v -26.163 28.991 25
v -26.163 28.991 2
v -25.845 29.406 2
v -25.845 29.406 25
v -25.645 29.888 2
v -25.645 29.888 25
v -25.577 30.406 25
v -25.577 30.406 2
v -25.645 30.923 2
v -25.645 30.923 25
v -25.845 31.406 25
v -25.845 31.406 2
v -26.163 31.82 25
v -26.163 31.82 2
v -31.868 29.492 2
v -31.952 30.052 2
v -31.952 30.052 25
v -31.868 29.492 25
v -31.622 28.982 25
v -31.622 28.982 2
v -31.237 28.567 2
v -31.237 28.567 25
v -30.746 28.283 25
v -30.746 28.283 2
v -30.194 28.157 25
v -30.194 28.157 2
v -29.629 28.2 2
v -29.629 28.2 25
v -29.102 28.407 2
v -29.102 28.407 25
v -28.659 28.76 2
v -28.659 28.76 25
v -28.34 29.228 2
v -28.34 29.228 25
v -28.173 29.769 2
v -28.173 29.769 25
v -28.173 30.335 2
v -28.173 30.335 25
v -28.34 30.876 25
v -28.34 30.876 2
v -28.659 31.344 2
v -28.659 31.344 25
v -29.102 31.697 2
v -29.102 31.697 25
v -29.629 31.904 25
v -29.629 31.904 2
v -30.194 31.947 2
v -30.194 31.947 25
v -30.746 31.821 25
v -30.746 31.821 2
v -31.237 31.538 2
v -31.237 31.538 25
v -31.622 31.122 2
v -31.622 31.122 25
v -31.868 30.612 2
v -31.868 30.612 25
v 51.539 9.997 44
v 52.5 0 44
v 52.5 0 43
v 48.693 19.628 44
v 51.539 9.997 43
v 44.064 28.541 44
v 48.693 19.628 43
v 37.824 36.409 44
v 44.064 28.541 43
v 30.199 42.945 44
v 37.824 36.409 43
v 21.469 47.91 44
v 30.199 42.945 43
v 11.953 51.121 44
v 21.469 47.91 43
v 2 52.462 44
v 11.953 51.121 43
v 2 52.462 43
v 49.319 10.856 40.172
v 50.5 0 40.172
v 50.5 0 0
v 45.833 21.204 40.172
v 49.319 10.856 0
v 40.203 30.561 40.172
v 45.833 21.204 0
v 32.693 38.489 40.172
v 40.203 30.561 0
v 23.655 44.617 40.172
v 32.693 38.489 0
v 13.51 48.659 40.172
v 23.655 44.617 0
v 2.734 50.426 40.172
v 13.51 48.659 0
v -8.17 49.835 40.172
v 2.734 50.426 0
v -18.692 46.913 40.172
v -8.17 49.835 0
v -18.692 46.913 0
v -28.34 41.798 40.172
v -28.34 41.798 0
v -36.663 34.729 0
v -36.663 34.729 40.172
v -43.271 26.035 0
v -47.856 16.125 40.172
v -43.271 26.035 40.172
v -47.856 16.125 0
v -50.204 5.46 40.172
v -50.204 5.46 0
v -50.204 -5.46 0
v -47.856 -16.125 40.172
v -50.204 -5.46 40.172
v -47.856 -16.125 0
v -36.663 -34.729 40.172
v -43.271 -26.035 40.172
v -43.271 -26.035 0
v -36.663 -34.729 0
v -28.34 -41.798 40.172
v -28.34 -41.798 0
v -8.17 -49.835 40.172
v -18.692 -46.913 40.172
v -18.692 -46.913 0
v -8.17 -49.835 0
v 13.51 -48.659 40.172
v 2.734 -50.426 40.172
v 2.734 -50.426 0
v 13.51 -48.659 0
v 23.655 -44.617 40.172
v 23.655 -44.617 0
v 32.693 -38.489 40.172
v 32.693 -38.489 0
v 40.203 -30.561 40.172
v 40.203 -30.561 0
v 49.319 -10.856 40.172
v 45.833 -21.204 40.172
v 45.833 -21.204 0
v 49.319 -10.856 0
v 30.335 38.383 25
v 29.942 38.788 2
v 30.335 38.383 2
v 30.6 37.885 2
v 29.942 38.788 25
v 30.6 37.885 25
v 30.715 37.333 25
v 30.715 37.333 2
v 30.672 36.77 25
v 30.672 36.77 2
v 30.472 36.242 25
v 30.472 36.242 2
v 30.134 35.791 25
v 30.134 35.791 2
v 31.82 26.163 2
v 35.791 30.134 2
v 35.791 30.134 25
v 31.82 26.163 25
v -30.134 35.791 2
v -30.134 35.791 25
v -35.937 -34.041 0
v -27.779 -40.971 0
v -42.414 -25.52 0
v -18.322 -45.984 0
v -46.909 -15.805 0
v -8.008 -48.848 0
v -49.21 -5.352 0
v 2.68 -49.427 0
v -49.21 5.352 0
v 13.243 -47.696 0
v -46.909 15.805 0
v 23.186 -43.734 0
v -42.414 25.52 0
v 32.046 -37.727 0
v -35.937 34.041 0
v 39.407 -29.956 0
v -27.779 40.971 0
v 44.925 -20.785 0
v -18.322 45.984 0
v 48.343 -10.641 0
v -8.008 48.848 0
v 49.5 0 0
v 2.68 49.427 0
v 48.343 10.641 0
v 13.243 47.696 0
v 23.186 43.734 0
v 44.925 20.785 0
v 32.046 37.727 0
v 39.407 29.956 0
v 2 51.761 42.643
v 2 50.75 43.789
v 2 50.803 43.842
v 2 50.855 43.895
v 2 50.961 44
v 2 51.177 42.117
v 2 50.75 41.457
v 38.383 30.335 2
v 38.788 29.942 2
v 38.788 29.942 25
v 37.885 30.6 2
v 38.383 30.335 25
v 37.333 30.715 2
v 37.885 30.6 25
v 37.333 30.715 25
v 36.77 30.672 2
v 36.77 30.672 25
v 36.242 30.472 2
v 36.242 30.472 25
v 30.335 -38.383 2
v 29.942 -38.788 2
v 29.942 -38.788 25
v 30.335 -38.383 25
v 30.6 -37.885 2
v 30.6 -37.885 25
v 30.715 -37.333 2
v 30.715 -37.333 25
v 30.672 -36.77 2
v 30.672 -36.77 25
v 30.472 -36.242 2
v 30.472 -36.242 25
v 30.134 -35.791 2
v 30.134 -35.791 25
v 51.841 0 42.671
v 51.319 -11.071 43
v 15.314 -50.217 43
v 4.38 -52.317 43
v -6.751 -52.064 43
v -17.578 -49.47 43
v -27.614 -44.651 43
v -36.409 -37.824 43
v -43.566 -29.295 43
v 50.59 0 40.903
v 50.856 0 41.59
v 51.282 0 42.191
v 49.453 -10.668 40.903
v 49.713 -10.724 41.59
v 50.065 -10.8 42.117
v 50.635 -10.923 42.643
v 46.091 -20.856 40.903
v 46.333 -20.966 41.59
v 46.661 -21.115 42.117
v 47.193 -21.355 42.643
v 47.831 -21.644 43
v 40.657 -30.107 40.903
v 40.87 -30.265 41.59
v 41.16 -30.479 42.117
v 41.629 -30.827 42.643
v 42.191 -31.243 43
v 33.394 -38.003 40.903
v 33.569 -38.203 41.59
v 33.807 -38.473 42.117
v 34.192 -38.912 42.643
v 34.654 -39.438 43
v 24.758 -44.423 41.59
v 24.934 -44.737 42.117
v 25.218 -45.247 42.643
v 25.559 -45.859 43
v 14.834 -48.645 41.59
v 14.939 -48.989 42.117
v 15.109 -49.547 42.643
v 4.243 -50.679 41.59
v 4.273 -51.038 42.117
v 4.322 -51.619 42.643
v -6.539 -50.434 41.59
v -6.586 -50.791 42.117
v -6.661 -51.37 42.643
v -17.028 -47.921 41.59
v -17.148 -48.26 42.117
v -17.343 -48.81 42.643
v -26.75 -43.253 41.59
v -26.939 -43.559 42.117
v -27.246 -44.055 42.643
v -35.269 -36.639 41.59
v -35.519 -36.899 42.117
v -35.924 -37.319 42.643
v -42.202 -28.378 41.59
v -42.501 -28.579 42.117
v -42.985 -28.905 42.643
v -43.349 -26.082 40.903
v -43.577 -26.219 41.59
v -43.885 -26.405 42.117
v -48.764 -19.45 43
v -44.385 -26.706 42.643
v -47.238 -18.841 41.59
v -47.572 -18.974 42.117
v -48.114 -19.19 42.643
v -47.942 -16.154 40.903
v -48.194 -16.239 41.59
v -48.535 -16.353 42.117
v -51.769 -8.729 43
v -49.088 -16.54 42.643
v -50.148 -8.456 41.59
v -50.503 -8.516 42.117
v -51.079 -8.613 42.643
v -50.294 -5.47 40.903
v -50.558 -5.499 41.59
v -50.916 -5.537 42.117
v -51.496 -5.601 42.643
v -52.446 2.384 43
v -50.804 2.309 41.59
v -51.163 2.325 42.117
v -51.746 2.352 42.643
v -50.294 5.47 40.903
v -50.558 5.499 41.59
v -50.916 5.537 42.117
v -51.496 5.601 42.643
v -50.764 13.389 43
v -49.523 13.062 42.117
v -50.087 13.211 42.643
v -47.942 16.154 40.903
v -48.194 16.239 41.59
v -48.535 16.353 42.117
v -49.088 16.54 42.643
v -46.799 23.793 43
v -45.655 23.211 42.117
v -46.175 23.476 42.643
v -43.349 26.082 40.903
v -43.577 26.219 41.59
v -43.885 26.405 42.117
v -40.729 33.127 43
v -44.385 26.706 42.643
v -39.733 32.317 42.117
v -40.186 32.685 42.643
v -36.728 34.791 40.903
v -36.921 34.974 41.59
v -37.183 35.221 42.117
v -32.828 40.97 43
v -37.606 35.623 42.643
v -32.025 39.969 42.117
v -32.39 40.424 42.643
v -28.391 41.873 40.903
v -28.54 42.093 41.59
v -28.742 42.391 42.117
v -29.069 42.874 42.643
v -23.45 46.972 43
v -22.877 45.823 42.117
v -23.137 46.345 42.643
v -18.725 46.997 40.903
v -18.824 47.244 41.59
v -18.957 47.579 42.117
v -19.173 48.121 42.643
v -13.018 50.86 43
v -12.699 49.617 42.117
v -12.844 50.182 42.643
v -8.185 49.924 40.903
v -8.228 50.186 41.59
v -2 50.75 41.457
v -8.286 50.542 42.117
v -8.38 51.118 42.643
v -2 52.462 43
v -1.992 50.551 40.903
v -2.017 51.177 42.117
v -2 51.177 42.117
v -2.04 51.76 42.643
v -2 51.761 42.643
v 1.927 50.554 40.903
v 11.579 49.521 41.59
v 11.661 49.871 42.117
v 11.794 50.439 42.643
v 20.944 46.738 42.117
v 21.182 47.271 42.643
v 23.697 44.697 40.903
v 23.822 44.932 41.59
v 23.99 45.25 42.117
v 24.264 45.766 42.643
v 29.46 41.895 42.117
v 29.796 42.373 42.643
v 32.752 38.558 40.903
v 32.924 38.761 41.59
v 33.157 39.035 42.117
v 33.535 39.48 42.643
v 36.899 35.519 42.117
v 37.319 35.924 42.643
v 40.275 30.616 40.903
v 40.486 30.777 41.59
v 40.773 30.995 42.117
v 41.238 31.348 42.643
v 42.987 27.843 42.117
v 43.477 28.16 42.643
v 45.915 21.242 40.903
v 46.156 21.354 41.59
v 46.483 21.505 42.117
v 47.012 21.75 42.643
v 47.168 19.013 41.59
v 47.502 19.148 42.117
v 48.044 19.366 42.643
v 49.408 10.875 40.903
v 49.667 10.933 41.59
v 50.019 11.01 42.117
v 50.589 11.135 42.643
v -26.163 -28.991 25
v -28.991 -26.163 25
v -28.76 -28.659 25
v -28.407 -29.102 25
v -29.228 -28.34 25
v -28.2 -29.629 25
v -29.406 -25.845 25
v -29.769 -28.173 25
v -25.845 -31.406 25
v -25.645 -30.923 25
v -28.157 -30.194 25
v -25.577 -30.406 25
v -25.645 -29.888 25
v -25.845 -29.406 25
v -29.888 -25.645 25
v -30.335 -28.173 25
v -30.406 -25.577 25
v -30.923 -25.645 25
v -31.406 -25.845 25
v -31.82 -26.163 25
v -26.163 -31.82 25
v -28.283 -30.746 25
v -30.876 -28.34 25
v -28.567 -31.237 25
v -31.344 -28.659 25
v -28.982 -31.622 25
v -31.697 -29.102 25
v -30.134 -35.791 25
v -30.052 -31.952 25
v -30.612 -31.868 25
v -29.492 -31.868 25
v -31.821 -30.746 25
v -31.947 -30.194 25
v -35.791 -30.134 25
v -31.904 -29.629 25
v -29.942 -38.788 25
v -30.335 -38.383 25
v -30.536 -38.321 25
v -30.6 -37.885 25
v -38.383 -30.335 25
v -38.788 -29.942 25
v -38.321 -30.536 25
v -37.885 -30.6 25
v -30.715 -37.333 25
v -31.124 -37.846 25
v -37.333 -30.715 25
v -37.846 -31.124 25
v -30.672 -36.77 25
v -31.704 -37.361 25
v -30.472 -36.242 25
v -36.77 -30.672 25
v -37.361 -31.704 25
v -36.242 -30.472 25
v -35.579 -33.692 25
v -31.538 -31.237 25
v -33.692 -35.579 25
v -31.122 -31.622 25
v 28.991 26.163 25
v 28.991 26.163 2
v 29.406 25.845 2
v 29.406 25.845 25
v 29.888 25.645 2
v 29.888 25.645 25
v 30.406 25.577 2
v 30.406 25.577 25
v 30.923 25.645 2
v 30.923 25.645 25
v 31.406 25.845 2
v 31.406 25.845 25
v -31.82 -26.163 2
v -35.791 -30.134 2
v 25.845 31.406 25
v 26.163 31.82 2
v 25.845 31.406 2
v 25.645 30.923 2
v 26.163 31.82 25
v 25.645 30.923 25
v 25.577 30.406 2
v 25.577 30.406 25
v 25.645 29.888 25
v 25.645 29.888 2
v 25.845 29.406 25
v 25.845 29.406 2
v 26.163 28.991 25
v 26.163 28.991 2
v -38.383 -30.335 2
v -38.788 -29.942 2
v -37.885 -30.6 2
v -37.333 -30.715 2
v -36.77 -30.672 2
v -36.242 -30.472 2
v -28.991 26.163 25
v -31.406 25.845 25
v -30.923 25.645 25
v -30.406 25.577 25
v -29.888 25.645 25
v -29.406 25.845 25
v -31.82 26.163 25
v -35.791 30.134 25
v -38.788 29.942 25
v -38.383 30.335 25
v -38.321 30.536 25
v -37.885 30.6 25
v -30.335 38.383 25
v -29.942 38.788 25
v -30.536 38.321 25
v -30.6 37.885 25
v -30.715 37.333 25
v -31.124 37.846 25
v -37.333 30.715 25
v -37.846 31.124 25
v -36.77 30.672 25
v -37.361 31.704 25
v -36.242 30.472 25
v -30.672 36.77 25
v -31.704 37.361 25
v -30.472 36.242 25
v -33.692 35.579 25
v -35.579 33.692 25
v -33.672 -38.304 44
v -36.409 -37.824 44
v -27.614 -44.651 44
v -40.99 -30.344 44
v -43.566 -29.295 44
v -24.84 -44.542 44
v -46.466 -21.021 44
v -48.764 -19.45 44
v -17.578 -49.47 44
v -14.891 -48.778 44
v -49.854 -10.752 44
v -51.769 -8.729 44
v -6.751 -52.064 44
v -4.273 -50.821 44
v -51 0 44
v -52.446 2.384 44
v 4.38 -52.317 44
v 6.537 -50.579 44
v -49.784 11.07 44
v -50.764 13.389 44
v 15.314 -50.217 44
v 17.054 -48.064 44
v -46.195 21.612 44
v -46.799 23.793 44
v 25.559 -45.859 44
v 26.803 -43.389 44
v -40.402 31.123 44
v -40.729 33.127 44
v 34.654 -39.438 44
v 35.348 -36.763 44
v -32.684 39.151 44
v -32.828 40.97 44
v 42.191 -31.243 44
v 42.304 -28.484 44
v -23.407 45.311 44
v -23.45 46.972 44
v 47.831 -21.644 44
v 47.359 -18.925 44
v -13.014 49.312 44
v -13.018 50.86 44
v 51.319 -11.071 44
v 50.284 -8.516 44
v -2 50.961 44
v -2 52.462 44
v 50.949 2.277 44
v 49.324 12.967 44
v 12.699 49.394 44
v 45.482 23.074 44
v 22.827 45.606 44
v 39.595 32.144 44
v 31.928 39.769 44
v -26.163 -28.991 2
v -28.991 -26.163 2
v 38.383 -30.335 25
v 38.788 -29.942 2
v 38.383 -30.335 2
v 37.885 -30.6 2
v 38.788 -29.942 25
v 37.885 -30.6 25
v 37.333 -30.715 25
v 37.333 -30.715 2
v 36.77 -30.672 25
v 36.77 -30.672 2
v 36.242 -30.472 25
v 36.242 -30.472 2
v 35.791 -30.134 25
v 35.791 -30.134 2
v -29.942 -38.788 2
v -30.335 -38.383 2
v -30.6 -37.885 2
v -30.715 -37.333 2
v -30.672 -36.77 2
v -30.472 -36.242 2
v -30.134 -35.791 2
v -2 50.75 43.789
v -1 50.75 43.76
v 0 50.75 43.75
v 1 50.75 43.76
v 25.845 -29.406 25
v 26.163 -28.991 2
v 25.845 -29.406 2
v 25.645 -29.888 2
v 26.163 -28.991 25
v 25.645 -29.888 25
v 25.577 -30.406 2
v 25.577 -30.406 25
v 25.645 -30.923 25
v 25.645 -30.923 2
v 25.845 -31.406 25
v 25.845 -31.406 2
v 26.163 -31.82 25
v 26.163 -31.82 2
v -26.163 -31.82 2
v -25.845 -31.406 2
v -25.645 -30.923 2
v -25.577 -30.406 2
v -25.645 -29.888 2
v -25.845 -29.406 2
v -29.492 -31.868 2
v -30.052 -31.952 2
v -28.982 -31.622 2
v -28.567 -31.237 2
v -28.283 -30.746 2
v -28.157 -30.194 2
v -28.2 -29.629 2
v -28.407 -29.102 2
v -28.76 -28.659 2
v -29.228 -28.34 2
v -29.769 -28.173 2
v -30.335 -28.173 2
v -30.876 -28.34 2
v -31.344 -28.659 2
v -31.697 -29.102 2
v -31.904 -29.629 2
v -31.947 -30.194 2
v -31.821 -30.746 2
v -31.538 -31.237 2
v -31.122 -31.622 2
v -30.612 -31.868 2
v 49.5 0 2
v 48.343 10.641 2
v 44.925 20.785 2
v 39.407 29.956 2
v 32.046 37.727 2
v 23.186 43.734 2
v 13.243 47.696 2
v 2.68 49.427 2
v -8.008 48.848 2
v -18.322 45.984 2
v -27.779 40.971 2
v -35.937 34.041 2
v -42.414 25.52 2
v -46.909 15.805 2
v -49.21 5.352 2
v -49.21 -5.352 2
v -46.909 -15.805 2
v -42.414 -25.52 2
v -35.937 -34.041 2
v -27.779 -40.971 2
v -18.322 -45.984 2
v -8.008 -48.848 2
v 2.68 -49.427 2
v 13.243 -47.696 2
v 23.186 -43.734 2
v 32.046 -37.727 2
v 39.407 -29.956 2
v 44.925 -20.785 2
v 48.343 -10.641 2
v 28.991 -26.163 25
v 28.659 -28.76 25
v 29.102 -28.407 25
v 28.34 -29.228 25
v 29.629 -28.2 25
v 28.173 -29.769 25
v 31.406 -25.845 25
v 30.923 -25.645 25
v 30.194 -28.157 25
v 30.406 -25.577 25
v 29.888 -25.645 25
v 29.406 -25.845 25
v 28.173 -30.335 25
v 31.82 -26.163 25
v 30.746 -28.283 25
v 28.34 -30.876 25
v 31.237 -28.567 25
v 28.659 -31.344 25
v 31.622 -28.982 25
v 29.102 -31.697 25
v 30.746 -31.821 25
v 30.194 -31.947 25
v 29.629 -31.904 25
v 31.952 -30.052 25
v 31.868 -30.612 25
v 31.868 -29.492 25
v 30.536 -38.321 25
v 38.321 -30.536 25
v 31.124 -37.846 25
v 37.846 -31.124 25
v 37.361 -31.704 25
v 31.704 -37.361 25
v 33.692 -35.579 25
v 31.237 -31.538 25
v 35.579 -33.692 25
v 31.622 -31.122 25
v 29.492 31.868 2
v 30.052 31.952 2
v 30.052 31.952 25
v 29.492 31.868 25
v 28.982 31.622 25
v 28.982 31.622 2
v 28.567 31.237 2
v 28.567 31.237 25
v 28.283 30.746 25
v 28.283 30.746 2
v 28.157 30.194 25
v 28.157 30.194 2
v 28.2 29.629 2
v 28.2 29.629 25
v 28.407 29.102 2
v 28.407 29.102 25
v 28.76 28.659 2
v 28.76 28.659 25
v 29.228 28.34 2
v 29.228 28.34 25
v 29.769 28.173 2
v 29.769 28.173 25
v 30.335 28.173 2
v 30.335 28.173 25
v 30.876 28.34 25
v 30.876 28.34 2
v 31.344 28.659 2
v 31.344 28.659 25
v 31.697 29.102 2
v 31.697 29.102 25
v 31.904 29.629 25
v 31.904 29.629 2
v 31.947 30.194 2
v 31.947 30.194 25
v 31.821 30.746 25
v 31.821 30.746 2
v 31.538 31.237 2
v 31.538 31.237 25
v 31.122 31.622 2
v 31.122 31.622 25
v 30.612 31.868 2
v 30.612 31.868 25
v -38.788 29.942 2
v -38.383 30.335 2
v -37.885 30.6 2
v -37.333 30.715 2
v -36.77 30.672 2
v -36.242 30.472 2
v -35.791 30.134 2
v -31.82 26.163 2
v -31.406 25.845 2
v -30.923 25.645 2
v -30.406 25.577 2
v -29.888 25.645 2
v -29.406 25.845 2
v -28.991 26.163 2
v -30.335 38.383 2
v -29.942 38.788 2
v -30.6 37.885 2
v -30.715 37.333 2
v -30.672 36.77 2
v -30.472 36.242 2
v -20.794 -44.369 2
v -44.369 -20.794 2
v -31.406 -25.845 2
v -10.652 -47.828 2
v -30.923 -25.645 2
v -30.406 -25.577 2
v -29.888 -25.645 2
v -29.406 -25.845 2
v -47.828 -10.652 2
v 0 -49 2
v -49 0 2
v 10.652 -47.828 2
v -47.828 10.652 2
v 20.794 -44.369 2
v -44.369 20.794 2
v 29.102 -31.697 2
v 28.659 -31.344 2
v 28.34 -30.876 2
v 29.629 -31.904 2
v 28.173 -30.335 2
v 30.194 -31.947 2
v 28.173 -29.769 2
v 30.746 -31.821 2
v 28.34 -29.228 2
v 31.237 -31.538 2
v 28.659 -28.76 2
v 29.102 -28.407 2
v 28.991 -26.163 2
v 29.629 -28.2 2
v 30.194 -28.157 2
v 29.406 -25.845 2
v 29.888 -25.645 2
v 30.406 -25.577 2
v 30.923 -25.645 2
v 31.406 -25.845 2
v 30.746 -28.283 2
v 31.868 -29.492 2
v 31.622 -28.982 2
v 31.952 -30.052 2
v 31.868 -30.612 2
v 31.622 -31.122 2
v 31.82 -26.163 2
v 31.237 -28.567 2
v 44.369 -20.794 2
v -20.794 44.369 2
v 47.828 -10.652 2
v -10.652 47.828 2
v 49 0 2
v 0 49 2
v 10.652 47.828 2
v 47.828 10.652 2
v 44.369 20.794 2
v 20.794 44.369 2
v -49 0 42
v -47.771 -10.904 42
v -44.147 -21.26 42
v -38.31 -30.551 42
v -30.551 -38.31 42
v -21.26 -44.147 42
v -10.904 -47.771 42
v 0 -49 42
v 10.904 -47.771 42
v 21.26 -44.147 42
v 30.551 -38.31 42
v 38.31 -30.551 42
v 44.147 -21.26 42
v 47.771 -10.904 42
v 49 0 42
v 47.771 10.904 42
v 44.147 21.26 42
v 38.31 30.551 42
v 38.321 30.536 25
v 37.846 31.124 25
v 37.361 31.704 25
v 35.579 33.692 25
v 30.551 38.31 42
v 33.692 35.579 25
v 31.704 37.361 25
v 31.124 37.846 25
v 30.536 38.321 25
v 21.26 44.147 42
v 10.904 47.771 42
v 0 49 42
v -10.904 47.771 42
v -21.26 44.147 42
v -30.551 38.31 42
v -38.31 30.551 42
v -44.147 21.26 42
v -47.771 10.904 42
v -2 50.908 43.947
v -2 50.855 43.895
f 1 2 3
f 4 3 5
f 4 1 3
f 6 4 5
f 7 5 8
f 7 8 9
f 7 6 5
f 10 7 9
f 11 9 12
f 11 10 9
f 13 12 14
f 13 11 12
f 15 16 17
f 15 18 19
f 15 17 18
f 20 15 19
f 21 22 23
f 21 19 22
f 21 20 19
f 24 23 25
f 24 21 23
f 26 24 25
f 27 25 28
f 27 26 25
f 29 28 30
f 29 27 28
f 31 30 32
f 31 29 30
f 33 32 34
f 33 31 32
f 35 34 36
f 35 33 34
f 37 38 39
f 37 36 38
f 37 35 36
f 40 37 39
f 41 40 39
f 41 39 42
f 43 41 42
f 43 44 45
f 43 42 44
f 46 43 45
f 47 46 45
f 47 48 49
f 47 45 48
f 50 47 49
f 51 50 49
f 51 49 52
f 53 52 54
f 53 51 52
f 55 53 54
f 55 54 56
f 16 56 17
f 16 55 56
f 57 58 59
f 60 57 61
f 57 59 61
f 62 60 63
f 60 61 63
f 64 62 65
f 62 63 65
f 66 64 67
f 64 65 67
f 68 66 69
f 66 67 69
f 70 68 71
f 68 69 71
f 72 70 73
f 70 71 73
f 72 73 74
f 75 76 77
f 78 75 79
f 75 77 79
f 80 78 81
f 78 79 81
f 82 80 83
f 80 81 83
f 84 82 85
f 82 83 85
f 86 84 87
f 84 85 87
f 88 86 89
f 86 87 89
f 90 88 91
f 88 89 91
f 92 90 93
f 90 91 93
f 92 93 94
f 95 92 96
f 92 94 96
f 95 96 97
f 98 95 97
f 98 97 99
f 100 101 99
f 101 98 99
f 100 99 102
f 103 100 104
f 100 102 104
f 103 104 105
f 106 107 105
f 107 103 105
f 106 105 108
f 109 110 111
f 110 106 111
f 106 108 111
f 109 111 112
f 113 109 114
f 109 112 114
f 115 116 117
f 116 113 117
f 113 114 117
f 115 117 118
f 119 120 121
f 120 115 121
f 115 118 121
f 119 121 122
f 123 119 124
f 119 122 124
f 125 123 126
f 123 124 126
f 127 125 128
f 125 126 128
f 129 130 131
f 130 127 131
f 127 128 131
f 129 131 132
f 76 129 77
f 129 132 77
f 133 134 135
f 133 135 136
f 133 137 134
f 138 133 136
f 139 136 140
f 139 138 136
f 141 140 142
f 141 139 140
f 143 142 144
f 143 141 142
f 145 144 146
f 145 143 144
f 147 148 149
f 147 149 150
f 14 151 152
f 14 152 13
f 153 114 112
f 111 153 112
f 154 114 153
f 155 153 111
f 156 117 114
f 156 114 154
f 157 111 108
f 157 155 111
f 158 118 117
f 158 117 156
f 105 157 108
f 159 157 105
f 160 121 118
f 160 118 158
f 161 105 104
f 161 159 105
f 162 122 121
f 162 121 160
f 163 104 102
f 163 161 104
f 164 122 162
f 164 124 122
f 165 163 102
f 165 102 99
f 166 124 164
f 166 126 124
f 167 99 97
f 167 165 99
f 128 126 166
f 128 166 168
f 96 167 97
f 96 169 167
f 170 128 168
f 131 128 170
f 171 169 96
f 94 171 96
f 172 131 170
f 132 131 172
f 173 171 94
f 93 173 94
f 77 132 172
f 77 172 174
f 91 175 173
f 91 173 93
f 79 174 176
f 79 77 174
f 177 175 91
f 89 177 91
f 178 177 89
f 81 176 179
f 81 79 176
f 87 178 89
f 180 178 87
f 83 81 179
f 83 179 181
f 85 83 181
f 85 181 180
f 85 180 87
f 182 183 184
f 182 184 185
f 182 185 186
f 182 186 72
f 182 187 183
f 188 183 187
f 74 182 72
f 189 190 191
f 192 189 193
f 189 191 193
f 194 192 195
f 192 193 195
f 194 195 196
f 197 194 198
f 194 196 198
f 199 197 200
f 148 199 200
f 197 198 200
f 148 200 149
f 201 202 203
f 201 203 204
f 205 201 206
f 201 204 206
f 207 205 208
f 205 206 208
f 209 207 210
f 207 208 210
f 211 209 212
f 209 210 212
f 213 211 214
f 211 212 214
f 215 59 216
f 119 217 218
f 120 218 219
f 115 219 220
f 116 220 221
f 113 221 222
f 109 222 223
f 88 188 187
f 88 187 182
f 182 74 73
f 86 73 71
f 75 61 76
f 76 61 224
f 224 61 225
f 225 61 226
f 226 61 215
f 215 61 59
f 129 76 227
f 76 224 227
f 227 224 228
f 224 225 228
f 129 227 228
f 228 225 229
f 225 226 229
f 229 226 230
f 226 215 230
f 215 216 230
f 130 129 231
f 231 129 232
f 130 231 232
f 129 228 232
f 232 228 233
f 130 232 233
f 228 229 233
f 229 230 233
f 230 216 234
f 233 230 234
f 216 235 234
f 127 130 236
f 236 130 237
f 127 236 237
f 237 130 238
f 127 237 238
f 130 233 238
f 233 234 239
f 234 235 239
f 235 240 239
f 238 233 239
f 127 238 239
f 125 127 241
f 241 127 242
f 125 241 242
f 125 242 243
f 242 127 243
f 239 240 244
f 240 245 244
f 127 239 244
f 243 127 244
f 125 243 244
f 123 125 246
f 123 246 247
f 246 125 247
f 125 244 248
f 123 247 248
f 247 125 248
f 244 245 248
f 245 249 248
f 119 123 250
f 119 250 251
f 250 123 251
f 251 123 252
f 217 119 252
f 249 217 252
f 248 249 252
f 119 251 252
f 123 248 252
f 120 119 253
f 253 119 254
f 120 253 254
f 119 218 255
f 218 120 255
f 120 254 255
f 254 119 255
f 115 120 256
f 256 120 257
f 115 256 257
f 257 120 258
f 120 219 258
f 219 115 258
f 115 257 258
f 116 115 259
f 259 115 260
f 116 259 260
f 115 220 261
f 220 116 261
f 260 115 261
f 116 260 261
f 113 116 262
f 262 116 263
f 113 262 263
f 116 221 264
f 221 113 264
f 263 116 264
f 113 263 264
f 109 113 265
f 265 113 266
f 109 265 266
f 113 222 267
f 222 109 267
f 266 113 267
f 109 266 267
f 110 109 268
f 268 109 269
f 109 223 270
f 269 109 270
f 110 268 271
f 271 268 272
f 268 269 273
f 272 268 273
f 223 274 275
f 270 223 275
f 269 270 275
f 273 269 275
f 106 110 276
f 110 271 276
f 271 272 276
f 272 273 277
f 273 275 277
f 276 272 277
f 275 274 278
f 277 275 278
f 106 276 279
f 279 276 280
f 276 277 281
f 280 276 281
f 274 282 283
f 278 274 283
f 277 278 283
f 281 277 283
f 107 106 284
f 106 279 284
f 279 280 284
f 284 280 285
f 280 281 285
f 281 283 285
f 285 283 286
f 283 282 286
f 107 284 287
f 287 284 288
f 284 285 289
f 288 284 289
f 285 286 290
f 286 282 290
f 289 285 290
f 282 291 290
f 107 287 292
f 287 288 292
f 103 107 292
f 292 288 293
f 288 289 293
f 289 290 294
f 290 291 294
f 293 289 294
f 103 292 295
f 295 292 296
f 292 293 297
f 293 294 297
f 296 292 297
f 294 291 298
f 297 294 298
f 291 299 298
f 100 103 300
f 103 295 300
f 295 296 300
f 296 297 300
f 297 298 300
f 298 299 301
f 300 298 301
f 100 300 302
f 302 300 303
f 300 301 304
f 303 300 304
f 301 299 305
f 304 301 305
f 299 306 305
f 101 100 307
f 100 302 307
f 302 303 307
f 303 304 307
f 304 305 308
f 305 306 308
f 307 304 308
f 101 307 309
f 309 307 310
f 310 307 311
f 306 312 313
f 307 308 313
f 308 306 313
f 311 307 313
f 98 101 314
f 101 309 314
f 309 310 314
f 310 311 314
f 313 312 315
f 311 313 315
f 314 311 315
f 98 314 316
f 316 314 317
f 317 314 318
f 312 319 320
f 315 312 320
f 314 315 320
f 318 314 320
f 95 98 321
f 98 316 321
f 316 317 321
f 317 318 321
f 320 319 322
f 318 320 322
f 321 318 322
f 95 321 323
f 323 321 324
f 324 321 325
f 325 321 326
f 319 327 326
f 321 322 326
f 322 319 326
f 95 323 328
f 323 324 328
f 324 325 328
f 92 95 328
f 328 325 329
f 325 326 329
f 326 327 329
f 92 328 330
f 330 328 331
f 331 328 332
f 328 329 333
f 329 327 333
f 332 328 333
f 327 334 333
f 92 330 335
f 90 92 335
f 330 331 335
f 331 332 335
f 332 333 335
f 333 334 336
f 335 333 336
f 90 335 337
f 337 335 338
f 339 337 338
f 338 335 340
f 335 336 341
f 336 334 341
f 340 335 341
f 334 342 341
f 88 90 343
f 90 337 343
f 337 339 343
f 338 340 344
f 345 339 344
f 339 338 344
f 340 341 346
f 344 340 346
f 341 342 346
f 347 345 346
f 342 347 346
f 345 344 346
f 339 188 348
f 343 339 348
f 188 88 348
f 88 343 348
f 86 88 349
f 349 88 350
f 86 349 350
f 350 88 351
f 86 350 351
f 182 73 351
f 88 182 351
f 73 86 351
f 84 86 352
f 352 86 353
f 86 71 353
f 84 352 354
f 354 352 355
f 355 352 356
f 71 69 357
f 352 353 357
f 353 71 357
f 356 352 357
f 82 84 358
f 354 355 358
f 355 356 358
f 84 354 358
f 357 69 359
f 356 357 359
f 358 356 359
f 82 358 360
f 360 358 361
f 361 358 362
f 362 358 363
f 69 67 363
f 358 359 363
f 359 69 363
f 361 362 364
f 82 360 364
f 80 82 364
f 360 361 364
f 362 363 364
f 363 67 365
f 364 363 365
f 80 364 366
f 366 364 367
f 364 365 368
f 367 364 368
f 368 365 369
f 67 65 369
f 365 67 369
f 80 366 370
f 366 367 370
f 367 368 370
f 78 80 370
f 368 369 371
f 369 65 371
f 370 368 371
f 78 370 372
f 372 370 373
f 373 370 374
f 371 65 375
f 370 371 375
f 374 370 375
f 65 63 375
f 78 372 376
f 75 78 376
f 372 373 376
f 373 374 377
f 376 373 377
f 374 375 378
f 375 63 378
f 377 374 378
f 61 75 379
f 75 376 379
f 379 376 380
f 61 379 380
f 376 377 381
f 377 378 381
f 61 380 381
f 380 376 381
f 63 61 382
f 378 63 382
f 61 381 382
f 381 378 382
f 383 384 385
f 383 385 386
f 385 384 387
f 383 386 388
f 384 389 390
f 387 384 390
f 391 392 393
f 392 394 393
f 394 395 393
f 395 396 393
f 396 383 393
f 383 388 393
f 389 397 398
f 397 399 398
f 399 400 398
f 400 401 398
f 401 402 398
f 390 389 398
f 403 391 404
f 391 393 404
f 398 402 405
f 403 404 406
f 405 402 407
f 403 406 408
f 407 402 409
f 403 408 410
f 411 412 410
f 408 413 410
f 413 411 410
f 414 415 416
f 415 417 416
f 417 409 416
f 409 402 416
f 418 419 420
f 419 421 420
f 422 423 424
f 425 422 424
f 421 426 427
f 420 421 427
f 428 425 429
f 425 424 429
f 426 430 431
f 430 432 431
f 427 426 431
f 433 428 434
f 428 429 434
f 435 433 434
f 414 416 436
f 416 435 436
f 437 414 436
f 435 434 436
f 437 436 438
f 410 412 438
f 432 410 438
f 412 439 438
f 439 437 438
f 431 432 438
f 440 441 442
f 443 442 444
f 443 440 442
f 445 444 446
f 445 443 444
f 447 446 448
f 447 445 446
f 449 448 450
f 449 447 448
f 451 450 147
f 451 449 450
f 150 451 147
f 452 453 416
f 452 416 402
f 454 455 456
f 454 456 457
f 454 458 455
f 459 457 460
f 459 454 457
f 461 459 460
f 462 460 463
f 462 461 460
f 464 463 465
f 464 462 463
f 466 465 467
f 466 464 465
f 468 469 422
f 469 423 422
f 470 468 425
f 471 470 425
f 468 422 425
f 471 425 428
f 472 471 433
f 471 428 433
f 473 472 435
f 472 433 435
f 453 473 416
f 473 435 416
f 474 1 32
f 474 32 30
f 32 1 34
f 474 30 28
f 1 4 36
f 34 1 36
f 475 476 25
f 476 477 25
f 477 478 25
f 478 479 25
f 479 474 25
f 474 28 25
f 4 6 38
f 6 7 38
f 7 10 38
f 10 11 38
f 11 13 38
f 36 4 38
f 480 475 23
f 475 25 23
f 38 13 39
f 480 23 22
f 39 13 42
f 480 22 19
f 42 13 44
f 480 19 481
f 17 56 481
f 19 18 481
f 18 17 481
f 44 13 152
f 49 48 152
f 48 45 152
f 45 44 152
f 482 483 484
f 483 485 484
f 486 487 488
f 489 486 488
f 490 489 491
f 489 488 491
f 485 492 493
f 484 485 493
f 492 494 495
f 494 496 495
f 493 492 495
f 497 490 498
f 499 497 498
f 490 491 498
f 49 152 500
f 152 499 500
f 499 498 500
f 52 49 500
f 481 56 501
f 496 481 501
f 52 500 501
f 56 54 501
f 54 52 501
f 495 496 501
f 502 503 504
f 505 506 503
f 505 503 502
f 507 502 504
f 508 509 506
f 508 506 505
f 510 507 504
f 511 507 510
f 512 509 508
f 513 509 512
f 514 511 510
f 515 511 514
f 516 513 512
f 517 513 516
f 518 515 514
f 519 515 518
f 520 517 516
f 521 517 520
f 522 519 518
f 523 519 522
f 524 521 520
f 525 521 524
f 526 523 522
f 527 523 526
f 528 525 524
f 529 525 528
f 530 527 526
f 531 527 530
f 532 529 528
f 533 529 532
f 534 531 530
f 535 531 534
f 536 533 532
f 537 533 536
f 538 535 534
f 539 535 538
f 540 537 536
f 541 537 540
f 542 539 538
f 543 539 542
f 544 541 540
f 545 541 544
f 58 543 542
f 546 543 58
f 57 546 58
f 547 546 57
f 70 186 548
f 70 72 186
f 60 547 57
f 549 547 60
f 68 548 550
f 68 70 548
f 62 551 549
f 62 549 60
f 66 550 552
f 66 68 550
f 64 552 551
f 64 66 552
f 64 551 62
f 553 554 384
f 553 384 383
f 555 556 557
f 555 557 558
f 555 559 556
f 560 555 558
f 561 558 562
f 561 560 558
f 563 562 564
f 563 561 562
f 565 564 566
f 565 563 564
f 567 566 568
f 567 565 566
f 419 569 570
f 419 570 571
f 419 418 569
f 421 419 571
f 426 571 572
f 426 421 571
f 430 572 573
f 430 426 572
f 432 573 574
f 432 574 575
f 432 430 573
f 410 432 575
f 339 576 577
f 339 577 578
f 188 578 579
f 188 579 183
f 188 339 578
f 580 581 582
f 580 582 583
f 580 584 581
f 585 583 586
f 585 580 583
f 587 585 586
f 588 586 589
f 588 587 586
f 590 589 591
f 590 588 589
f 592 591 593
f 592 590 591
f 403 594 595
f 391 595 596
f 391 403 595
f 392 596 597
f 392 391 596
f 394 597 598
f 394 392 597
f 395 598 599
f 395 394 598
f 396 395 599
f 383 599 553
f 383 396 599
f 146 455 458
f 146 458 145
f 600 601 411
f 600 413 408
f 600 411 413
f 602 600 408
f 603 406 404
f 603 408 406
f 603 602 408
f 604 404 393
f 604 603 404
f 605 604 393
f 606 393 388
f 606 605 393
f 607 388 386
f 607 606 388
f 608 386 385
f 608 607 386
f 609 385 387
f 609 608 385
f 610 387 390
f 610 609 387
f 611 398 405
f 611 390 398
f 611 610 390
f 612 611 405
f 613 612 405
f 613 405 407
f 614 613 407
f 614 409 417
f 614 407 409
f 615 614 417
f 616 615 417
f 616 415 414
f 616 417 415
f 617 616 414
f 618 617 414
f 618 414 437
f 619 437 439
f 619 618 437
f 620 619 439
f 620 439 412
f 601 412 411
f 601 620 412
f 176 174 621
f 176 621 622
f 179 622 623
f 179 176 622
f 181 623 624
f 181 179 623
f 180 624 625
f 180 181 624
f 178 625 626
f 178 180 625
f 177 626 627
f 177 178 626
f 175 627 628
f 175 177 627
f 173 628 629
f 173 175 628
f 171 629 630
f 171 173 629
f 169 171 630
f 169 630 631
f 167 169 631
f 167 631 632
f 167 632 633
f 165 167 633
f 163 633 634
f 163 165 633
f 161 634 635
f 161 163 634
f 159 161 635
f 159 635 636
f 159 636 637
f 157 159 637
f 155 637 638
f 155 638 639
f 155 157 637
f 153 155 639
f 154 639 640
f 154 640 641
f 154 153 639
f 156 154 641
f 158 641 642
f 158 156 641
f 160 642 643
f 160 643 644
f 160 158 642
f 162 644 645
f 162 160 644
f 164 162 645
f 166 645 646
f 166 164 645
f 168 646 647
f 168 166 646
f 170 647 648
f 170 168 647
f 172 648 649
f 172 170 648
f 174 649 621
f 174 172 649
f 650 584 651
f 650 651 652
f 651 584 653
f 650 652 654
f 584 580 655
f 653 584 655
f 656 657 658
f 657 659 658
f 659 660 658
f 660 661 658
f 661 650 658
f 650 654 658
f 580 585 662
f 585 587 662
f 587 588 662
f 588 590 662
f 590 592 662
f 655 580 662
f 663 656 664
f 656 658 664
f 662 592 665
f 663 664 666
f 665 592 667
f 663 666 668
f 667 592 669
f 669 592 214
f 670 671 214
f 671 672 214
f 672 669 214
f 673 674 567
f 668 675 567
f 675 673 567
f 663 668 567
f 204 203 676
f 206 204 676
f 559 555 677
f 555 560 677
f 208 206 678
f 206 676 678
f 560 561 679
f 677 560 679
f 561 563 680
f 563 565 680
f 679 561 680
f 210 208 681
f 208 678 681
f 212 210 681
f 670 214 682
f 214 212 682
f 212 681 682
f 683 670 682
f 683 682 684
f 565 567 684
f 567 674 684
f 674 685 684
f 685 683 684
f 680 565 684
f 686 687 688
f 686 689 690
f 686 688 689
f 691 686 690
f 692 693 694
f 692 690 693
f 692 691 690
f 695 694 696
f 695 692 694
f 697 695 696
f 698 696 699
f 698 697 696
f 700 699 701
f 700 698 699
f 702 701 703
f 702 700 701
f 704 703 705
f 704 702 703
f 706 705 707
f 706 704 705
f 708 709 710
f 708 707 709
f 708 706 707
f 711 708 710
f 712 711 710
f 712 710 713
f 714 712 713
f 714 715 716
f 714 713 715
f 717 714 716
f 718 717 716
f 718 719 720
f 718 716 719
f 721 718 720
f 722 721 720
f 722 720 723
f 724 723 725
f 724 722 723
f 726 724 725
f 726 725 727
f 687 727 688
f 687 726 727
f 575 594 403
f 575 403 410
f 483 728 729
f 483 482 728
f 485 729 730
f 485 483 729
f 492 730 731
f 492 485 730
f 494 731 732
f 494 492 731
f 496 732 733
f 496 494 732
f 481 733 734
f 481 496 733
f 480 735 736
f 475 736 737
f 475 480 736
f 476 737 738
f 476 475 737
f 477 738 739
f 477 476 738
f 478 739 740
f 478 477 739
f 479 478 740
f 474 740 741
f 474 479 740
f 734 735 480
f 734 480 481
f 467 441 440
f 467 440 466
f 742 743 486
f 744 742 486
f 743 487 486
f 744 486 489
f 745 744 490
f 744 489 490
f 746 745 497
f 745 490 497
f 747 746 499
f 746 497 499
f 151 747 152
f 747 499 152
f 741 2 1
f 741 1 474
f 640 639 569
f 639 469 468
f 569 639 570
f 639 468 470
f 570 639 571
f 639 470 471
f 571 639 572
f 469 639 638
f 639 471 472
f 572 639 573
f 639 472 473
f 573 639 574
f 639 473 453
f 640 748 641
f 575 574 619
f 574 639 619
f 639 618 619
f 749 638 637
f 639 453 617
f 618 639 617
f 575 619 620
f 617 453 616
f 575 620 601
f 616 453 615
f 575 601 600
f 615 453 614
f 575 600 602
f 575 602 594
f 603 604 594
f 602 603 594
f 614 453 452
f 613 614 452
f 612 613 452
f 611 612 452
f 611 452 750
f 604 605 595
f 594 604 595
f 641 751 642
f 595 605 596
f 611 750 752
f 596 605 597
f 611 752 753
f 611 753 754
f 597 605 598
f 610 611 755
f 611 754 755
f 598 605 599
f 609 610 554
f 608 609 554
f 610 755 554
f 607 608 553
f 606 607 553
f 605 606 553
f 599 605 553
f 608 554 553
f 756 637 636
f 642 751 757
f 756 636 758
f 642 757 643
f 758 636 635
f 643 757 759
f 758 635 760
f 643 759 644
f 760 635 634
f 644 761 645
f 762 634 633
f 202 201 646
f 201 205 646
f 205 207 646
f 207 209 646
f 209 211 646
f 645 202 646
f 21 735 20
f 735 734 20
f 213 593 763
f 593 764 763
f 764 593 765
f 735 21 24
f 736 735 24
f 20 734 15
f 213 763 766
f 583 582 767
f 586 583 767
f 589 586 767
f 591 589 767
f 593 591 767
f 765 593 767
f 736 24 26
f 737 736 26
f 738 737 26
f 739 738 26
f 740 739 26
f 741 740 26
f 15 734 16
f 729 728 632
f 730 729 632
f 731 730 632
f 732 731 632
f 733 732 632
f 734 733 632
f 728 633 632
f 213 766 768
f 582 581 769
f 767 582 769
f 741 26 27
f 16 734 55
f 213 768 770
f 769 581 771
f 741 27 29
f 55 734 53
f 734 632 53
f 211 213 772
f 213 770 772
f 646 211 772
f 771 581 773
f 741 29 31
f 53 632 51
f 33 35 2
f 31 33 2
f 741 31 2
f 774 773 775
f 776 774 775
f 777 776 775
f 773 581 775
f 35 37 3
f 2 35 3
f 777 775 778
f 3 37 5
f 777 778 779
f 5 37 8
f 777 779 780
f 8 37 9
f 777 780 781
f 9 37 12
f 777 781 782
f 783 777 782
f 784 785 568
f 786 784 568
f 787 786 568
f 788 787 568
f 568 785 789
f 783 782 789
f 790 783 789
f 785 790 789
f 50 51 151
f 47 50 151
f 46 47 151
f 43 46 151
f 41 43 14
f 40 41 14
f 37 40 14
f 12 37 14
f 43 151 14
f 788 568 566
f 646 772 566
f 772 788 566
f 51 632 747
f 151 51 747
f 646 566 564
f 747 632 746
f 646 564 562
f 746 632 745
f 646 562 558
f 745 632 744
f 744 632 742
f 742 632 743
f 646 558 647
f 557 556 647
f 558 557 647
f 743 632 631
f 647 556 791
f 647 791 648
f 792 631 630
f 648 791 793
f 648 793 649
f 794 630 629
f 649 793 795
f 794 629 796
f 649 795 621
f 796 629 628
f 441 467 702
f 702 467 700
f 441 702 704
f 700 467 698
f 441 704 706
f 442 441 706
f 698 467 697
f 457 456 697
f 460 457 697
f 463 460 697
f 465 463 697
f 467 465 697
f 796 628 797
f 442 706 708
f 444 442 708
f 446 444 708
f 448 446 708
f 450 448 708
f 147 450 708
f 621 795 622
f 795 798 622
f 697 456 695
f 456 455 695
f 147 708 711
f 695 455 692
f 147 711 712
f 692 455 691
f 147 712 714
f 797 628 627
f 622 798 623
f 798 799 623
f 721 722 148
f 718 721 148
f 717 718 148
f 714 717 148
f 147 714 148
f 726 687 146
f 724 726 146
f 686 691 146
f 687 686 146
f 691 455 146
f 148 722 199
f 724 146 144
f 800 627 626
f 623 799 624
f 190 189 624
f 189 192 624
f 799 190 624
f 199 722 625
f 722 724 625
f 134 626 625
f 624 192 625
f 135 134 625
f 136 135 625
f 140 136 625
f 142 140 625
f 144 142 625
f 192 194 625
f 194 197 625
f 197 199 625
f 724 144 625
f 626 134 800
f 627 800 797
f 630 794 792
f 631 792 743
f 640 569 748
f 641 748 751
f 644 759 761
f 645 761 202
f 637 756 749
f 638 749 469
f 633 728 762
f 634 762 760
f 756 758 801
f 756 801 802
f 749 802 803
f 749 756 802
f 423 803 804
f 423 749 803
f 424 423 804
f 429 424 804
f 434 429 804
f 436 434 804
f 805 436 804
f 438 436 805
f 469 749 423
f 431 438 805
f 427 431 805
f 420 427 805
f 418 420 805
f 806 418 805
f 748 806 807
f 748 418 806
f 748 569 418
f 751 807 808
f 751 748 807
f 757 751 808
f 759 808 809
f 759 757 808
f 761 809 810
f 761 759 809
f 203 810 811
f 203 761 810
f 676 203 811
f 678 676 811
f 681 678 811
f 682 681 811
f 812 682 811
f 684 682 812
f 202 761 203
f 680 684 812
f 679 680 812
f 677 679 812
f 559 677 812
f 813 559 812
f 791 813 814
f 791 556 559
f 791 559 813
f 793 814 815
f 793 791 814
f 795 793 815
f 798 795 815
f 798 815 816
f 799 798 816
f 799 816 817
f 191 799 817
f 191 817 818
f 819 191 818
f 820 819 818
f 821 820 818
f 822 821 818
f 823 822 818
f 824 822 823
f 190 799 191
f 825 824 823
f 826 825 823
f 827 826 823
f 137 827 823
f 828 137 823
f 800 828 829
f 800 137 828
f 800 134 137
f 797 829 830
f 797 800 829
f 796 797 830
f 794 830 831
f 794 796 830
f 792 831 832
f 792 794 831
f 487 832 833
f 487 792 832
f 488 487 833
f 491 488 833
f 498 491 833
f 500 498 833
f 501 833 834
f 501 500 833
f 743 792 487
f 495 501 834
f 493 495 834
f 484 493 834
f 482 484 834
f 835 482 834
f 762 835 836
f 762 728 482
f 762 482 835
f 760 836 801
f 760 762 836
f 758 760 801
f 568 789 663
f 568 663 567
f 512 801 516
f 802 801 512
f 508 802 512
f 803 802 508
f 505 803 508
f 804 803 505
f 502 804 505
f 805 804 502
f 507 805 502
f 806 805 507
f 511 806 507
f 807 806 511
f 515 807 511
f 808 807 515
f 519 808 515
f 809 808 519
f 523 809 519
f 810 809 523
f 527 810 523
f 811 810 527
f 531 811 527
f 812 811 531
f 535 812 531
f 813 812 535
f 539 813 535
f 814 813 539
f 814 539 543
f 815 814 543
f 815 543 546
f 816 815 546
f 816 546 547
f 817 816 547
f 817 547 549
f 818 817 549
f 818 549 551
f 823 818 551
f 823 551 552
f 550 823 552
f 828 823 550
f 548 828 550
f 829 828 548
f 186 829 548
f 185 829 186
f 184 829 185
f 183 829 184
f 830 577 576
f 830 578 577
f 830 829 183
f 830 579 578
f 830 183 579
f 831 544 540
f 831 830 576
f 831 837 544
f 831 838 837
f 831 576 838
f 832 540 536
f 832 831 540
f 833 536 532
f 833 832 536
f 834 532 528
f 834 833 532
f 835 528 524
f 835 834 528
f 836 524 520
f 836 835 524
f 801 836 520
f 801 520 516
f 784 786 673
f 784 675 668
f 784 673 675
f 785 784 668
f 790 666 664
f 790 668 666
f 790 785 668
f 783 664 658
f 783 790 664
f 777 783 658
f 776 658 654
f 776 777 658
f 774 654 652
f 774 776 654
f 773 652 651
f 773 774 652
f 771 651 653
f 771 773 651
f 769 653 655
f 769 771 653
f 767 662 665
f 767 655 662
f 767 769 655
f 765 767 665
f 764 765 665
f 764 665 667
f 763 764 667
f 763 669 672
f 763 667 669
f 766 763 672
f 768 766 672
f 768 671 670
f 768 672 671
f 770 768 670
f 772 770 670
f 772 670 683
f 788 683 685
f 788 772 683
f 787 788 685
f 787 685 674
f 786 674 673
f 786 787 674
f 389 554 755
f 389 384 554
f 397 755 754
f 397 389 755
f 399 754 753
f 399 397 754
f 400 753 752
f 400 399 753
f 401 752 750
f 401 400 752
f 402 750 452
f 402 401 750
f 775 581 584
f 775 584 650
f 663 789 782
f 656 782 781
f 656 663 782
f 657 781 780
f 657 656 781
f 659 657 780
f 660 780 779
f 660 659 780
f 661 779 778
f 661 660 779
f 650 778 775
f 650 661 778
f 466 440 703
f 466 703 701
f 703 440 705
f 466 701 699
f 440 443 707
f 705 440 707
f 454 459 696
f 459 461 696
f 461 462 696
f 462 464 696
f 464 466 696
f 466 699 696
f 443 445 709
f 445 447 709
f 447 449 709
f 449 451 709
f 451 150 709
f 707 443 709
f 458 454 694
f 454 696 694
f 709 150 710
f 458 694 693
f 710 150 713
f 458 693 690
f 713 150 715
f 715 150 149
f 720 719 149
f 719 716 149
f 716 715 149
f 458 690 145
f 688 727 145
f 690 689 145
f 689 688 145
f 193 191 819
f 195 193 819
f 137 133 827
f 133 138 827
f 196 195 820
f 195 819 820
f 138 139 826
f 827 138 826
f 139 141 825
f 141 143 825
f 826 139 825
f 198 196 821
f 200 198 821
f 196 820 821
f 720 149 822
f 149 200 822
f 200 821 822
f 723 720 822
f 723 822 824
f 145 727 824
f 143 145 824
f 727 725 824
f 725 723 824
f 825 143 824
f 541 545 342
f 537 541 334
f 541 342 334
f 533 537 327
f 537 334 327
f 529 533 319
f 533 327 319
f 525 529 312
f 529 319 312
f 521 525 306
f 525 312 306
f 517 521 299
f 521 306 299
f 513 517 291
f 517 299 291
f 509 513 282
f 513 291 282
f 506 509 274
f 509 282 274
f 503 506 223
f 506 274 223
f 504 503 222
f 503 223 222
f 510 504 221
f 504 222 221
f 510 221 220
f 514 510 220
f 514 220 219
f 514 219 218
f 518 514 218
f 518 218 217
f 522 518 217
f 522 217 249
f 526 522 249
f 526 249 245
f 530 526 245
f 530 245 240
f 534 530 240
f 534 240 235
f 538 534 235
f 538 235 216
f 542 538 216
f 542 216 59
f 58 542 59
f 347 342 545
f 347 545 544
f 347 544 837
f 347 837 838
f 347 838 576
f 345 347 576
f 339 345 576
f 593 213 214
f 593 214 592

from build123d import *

# Parameters (mm, degrees)
SKETCH2_R                = 50.5
BOSS_EXTRUDE2_DEPTH      = 2
SKETCH3_R                = 50.5
SKETCH3_R_2              = 49
BOSS_EXTRUDE3_DEPTH      = 42
BOSS_EXTRUDE4_START      = -1
SKETCH4_R                = 52.5
SKETCH4_R_2              = 49
BOSS_EXTRUDE4_DEPTH      = 1
FILLET1_R                = 3
CHAMFER1_SIZE            = 2
SKETCH5_R                = 3
SKETCH5_R_2              = 2
SKETCH5_R_3              = 3.125
SKETCH5_R_4              = 3.625
CUT_EXTRUDE3_DEPTH       = 87.304692804
CIRPATTERN1_COUNT        = 4
BOSS_EXTRUDE6_DEPTH      = 25
FILLET3_R                = 2
CIRPATTERN2_COUNT        = 4
FILLET3_OF_CIRPATTERN2_R = 2
CUT_EXTRUDE4_DEPTH       = 87.304692804
SKETCH12_R               = 49.5
CUT_EXTRUDE5_DEPTH       = 2
CUT_EXTRUDE6_REACH       = 88.305
SKETCH10_R               = 1.9
CIRPATTERN3_COUNT        = 4


with BuildPart() as part:
    # Sketch2 → Boss-Extrude2 (new body)
    with BuildSketch(Plane.XY):
        Circle(SKETCH2_R)
    extrude(amount=BOSS_EXTRUDE2_DEPTH)

    # Sketch3 → Boss-Extrude3 (add)
    with BuildSketch(Plane.XY.offset(2)):
        Circle(SKETCH3_R)
        with Locations(Location((0, 0, 0), (0, 0, 180))):
            Circle(SKETCH3_R_2, mode=Mode.SUBTRACT)
    extrude(amount=BOSS_EXTRUDE3_DEPTH)

    # Sketch4 → Boss-Extrude4 (add)
    with BuildSketch(Plane.XY.offset(44).offset(BOSS_EXTRUDE4_START)):
        Circle(SKETCH4_R)
        with Locations(Location((0, 0, 0), (0, 0, 180))):
            Circle(SKETCH4_R_2, mode=Mode.SUBTRACT)
    extrude(amount=BOSS_EXTRUDE4_DEPTH)

    # Fillet1
    # the kernel refuses this fillet: 3 mm, written as the material it adds along each edge
    with BuildSketch(Plane(origin=(0, 0, 43), x_dir=(1, 0, 0), z_dir=(0, 1, 0))) as fillet1_piece_1:
        with BuildLine():
            CenterArc((53.5, 2.828427125), FILLET1_R, 180, 70.528779366)
            Line((52.5, 0), (52.48, -0.056568542))
            ThreePointArc((52.48, -0.056568542), (51.5, -0.06), (50.5, -0.06))
            Line((50.5, -0.06), (50.44, 0))
            Line((50.44, 0), (50.44, 2.828427125))
            Line((50.44, 2.828427125), (50.5, 2.828427125))
        make_face()
    revolve(axis=Axis((0, 0, 43), (0, 0, -1)))

    # Chamfer1
    chamfer1_edges = [part.edges().sort_by_distance(p)[0] for p in [
        (49, 0, 44),
    ]]
    chamfer(chamfer1_edges, length=CHAMFER1_SIZE)

    # Sketch5 → Cut-Extrude3 (cut, through all)
    with BuildSketch(Plane.XY):
        with Locations((0, 20)):
            Circle(SKETCH5_R)
        with Locations((0, 10)):
            Circle(SKETCH5_R_2)
        with Locations((0, 30)):
            Circle(SKETCH5_R_2)
        with Locations((10.125, 20)):
            Circle(SKETCH5_R_3)
        with Locations((-10.125, 20)):
            Circle(SKETCH5_R_4)
    cut_extrude3 = extrude(amount=CUT_EXTRUDE3_DEPTH, mode=Mode.SUBTRACT)

    # CirPattern1: Cut-Extrude3 ×4 about axis
    cirpattern1_axis = Axis((0, 0, 0), (0, 0, 1))
    for i in range(1, CIRPATTERN1_COUNT):
        add(cut_extrude3.rotate(cirpattern1_axis, i * 360 / CIRPATTERN1_COUNT), mode=Mode.SUBTRACT)

    # Sketch7 → Boss-Extrude6 (add)
    with BuildSketch(Plane(origin=(0, 0, 0), x_dir=(-1, 0, 0), z_dir=(0, 0, -1))):
        with BuildLine():
            Line((31.704166175, 37.361020424), (24.748737342, 30.405591591))
            Line((24.748737342, 30.405591591), (30.405591591, 24.748737342))
            Line((30.405591591, 24.748737342), (37.361020424, 31.704166175))
            ThreePointArc((37.361020424, 31.704166175), (34.648232278, 34.648232278), (31.704166175, 37.361020424))
        make_face()
    boss_extrude6 = extrude(amount=-BOSS_EXTRUDE6_DEPTH)

    # Fillet3
    fillet3_edges = [part.edges().sort_by_distance(p)[0] for p in [
        (-30.405591591, 24.748737342, 13.5),
        (-24.748737342, 30.405591591, 13.5),
        (-31.704166175, 37.361020424, 13.5),
        (-37.361020424, 31.704166175, 13.5),
    ]]
    fillet(fillet3_edges, radius=FILLET3_R)

    # CirPattern2: Boss-Extrude6 ×4 about axis
    cirpattern2_axis = Axis((0, 0, 0), (0, 0, 1))
    for i in range(1, CIRPATTERN2_COUNT):
        add(boss_extrude6.rotate(cirpattern2_axis, i * 360 / CIRPATTERN2_COUNT))

    # Fillet3 of CirPattern2
    fillet3_of_cirpattern2_edges = [part.edges().sort_by_distance(p)[0] for p in [
        (-24.748737342, -30.405591591, 13.5),
        (-30.405591591, -24.748737342, 13.5),
        (-37.361020424, -31.704166175, 13.5),
        (-31.704166175, -37.361020424, 13.5),
        (30.405591591, -24.748737342, 13.5),
        (24.748737342, -30.405591591, 13.5),
        (31.704166175, -37.361020424, 13.5),
        (37.361020424, -31.704166175, 13.5),
        (24.748737342, 30.405591591, 13.5),
        (30.405591591, 24.748737342, 13.5),
        (37.361020424, 31.704166175, 13.5),
        (31.704166175, 37.361020424, 13.5),
    ]]
    fillet(fillet3_of_cirpattern2_edges, radius=FILLET3_OF_CIRPATTERN2_R)

    # Sketch9 → Cut-Extrude4 (cut, through all)
    with BuildSketch(Plane.XY):
        with BuildLine():
            Line((-2, 52.46189093), (-2, 50.75))
            Line((-2, 50.75), (2, 50.75))
            Line((2, 50.75), (2, 52.46189093))
            ThreePointArc((2, 52.46189093), (0, 52.5), (-2, 52.46189093))
        make_face()
    extrude(amount=CUT_EXTRUDE4_DEPTH, mode=Mode.SUBTRACT)

    # Sketch12 → Cut-Extrude5 (cut)
    with BuildSketch(Plane.XY):
        Circle(SKETCH12_R)
    extrude(amount=CUT_EXTRUDE5_DEPTH, mode=Mode.SUBTRACT)

    # Sketch10 → Cut-Extrude6 (cut, up to next)
    with BuildSketch(Plane.XY, mode=Mode.PRIVATE) as cut_extrude6_sk1:
        with Locations(Location((-30.0520382, 30.0520382, 0), (0, 0, 180))):
            Circle(SKETCH10_R)
    cut_extrude6_tool1 = extrude(cut_extrude6_sk1.sketch, amount=CUT_EXTRUDE6_REACH, mode=Mode.PRIVATE) & part.part
    cut_extrude6 = cut_extrude6_tool1.solids().sort_by_distance((-30.052038, 30.052038, 0))[0]
    add(cut_extrude6, mode=Mode.SUBTRACT)

    # CirPattern3: Cut-Extrude6 ×4 about axis
    cirpattern3_axis = Axis((0, 0, 0), (0, 0, 1))
    for i in range(1, CIRPATTERN3_COUNT):
        add(cut_extrude6.rotate(cirpattern3_axis, i * 360 / CIRPATTERN3_COUNT), mode=Mode.SUBTRACT)


solid = part.part
